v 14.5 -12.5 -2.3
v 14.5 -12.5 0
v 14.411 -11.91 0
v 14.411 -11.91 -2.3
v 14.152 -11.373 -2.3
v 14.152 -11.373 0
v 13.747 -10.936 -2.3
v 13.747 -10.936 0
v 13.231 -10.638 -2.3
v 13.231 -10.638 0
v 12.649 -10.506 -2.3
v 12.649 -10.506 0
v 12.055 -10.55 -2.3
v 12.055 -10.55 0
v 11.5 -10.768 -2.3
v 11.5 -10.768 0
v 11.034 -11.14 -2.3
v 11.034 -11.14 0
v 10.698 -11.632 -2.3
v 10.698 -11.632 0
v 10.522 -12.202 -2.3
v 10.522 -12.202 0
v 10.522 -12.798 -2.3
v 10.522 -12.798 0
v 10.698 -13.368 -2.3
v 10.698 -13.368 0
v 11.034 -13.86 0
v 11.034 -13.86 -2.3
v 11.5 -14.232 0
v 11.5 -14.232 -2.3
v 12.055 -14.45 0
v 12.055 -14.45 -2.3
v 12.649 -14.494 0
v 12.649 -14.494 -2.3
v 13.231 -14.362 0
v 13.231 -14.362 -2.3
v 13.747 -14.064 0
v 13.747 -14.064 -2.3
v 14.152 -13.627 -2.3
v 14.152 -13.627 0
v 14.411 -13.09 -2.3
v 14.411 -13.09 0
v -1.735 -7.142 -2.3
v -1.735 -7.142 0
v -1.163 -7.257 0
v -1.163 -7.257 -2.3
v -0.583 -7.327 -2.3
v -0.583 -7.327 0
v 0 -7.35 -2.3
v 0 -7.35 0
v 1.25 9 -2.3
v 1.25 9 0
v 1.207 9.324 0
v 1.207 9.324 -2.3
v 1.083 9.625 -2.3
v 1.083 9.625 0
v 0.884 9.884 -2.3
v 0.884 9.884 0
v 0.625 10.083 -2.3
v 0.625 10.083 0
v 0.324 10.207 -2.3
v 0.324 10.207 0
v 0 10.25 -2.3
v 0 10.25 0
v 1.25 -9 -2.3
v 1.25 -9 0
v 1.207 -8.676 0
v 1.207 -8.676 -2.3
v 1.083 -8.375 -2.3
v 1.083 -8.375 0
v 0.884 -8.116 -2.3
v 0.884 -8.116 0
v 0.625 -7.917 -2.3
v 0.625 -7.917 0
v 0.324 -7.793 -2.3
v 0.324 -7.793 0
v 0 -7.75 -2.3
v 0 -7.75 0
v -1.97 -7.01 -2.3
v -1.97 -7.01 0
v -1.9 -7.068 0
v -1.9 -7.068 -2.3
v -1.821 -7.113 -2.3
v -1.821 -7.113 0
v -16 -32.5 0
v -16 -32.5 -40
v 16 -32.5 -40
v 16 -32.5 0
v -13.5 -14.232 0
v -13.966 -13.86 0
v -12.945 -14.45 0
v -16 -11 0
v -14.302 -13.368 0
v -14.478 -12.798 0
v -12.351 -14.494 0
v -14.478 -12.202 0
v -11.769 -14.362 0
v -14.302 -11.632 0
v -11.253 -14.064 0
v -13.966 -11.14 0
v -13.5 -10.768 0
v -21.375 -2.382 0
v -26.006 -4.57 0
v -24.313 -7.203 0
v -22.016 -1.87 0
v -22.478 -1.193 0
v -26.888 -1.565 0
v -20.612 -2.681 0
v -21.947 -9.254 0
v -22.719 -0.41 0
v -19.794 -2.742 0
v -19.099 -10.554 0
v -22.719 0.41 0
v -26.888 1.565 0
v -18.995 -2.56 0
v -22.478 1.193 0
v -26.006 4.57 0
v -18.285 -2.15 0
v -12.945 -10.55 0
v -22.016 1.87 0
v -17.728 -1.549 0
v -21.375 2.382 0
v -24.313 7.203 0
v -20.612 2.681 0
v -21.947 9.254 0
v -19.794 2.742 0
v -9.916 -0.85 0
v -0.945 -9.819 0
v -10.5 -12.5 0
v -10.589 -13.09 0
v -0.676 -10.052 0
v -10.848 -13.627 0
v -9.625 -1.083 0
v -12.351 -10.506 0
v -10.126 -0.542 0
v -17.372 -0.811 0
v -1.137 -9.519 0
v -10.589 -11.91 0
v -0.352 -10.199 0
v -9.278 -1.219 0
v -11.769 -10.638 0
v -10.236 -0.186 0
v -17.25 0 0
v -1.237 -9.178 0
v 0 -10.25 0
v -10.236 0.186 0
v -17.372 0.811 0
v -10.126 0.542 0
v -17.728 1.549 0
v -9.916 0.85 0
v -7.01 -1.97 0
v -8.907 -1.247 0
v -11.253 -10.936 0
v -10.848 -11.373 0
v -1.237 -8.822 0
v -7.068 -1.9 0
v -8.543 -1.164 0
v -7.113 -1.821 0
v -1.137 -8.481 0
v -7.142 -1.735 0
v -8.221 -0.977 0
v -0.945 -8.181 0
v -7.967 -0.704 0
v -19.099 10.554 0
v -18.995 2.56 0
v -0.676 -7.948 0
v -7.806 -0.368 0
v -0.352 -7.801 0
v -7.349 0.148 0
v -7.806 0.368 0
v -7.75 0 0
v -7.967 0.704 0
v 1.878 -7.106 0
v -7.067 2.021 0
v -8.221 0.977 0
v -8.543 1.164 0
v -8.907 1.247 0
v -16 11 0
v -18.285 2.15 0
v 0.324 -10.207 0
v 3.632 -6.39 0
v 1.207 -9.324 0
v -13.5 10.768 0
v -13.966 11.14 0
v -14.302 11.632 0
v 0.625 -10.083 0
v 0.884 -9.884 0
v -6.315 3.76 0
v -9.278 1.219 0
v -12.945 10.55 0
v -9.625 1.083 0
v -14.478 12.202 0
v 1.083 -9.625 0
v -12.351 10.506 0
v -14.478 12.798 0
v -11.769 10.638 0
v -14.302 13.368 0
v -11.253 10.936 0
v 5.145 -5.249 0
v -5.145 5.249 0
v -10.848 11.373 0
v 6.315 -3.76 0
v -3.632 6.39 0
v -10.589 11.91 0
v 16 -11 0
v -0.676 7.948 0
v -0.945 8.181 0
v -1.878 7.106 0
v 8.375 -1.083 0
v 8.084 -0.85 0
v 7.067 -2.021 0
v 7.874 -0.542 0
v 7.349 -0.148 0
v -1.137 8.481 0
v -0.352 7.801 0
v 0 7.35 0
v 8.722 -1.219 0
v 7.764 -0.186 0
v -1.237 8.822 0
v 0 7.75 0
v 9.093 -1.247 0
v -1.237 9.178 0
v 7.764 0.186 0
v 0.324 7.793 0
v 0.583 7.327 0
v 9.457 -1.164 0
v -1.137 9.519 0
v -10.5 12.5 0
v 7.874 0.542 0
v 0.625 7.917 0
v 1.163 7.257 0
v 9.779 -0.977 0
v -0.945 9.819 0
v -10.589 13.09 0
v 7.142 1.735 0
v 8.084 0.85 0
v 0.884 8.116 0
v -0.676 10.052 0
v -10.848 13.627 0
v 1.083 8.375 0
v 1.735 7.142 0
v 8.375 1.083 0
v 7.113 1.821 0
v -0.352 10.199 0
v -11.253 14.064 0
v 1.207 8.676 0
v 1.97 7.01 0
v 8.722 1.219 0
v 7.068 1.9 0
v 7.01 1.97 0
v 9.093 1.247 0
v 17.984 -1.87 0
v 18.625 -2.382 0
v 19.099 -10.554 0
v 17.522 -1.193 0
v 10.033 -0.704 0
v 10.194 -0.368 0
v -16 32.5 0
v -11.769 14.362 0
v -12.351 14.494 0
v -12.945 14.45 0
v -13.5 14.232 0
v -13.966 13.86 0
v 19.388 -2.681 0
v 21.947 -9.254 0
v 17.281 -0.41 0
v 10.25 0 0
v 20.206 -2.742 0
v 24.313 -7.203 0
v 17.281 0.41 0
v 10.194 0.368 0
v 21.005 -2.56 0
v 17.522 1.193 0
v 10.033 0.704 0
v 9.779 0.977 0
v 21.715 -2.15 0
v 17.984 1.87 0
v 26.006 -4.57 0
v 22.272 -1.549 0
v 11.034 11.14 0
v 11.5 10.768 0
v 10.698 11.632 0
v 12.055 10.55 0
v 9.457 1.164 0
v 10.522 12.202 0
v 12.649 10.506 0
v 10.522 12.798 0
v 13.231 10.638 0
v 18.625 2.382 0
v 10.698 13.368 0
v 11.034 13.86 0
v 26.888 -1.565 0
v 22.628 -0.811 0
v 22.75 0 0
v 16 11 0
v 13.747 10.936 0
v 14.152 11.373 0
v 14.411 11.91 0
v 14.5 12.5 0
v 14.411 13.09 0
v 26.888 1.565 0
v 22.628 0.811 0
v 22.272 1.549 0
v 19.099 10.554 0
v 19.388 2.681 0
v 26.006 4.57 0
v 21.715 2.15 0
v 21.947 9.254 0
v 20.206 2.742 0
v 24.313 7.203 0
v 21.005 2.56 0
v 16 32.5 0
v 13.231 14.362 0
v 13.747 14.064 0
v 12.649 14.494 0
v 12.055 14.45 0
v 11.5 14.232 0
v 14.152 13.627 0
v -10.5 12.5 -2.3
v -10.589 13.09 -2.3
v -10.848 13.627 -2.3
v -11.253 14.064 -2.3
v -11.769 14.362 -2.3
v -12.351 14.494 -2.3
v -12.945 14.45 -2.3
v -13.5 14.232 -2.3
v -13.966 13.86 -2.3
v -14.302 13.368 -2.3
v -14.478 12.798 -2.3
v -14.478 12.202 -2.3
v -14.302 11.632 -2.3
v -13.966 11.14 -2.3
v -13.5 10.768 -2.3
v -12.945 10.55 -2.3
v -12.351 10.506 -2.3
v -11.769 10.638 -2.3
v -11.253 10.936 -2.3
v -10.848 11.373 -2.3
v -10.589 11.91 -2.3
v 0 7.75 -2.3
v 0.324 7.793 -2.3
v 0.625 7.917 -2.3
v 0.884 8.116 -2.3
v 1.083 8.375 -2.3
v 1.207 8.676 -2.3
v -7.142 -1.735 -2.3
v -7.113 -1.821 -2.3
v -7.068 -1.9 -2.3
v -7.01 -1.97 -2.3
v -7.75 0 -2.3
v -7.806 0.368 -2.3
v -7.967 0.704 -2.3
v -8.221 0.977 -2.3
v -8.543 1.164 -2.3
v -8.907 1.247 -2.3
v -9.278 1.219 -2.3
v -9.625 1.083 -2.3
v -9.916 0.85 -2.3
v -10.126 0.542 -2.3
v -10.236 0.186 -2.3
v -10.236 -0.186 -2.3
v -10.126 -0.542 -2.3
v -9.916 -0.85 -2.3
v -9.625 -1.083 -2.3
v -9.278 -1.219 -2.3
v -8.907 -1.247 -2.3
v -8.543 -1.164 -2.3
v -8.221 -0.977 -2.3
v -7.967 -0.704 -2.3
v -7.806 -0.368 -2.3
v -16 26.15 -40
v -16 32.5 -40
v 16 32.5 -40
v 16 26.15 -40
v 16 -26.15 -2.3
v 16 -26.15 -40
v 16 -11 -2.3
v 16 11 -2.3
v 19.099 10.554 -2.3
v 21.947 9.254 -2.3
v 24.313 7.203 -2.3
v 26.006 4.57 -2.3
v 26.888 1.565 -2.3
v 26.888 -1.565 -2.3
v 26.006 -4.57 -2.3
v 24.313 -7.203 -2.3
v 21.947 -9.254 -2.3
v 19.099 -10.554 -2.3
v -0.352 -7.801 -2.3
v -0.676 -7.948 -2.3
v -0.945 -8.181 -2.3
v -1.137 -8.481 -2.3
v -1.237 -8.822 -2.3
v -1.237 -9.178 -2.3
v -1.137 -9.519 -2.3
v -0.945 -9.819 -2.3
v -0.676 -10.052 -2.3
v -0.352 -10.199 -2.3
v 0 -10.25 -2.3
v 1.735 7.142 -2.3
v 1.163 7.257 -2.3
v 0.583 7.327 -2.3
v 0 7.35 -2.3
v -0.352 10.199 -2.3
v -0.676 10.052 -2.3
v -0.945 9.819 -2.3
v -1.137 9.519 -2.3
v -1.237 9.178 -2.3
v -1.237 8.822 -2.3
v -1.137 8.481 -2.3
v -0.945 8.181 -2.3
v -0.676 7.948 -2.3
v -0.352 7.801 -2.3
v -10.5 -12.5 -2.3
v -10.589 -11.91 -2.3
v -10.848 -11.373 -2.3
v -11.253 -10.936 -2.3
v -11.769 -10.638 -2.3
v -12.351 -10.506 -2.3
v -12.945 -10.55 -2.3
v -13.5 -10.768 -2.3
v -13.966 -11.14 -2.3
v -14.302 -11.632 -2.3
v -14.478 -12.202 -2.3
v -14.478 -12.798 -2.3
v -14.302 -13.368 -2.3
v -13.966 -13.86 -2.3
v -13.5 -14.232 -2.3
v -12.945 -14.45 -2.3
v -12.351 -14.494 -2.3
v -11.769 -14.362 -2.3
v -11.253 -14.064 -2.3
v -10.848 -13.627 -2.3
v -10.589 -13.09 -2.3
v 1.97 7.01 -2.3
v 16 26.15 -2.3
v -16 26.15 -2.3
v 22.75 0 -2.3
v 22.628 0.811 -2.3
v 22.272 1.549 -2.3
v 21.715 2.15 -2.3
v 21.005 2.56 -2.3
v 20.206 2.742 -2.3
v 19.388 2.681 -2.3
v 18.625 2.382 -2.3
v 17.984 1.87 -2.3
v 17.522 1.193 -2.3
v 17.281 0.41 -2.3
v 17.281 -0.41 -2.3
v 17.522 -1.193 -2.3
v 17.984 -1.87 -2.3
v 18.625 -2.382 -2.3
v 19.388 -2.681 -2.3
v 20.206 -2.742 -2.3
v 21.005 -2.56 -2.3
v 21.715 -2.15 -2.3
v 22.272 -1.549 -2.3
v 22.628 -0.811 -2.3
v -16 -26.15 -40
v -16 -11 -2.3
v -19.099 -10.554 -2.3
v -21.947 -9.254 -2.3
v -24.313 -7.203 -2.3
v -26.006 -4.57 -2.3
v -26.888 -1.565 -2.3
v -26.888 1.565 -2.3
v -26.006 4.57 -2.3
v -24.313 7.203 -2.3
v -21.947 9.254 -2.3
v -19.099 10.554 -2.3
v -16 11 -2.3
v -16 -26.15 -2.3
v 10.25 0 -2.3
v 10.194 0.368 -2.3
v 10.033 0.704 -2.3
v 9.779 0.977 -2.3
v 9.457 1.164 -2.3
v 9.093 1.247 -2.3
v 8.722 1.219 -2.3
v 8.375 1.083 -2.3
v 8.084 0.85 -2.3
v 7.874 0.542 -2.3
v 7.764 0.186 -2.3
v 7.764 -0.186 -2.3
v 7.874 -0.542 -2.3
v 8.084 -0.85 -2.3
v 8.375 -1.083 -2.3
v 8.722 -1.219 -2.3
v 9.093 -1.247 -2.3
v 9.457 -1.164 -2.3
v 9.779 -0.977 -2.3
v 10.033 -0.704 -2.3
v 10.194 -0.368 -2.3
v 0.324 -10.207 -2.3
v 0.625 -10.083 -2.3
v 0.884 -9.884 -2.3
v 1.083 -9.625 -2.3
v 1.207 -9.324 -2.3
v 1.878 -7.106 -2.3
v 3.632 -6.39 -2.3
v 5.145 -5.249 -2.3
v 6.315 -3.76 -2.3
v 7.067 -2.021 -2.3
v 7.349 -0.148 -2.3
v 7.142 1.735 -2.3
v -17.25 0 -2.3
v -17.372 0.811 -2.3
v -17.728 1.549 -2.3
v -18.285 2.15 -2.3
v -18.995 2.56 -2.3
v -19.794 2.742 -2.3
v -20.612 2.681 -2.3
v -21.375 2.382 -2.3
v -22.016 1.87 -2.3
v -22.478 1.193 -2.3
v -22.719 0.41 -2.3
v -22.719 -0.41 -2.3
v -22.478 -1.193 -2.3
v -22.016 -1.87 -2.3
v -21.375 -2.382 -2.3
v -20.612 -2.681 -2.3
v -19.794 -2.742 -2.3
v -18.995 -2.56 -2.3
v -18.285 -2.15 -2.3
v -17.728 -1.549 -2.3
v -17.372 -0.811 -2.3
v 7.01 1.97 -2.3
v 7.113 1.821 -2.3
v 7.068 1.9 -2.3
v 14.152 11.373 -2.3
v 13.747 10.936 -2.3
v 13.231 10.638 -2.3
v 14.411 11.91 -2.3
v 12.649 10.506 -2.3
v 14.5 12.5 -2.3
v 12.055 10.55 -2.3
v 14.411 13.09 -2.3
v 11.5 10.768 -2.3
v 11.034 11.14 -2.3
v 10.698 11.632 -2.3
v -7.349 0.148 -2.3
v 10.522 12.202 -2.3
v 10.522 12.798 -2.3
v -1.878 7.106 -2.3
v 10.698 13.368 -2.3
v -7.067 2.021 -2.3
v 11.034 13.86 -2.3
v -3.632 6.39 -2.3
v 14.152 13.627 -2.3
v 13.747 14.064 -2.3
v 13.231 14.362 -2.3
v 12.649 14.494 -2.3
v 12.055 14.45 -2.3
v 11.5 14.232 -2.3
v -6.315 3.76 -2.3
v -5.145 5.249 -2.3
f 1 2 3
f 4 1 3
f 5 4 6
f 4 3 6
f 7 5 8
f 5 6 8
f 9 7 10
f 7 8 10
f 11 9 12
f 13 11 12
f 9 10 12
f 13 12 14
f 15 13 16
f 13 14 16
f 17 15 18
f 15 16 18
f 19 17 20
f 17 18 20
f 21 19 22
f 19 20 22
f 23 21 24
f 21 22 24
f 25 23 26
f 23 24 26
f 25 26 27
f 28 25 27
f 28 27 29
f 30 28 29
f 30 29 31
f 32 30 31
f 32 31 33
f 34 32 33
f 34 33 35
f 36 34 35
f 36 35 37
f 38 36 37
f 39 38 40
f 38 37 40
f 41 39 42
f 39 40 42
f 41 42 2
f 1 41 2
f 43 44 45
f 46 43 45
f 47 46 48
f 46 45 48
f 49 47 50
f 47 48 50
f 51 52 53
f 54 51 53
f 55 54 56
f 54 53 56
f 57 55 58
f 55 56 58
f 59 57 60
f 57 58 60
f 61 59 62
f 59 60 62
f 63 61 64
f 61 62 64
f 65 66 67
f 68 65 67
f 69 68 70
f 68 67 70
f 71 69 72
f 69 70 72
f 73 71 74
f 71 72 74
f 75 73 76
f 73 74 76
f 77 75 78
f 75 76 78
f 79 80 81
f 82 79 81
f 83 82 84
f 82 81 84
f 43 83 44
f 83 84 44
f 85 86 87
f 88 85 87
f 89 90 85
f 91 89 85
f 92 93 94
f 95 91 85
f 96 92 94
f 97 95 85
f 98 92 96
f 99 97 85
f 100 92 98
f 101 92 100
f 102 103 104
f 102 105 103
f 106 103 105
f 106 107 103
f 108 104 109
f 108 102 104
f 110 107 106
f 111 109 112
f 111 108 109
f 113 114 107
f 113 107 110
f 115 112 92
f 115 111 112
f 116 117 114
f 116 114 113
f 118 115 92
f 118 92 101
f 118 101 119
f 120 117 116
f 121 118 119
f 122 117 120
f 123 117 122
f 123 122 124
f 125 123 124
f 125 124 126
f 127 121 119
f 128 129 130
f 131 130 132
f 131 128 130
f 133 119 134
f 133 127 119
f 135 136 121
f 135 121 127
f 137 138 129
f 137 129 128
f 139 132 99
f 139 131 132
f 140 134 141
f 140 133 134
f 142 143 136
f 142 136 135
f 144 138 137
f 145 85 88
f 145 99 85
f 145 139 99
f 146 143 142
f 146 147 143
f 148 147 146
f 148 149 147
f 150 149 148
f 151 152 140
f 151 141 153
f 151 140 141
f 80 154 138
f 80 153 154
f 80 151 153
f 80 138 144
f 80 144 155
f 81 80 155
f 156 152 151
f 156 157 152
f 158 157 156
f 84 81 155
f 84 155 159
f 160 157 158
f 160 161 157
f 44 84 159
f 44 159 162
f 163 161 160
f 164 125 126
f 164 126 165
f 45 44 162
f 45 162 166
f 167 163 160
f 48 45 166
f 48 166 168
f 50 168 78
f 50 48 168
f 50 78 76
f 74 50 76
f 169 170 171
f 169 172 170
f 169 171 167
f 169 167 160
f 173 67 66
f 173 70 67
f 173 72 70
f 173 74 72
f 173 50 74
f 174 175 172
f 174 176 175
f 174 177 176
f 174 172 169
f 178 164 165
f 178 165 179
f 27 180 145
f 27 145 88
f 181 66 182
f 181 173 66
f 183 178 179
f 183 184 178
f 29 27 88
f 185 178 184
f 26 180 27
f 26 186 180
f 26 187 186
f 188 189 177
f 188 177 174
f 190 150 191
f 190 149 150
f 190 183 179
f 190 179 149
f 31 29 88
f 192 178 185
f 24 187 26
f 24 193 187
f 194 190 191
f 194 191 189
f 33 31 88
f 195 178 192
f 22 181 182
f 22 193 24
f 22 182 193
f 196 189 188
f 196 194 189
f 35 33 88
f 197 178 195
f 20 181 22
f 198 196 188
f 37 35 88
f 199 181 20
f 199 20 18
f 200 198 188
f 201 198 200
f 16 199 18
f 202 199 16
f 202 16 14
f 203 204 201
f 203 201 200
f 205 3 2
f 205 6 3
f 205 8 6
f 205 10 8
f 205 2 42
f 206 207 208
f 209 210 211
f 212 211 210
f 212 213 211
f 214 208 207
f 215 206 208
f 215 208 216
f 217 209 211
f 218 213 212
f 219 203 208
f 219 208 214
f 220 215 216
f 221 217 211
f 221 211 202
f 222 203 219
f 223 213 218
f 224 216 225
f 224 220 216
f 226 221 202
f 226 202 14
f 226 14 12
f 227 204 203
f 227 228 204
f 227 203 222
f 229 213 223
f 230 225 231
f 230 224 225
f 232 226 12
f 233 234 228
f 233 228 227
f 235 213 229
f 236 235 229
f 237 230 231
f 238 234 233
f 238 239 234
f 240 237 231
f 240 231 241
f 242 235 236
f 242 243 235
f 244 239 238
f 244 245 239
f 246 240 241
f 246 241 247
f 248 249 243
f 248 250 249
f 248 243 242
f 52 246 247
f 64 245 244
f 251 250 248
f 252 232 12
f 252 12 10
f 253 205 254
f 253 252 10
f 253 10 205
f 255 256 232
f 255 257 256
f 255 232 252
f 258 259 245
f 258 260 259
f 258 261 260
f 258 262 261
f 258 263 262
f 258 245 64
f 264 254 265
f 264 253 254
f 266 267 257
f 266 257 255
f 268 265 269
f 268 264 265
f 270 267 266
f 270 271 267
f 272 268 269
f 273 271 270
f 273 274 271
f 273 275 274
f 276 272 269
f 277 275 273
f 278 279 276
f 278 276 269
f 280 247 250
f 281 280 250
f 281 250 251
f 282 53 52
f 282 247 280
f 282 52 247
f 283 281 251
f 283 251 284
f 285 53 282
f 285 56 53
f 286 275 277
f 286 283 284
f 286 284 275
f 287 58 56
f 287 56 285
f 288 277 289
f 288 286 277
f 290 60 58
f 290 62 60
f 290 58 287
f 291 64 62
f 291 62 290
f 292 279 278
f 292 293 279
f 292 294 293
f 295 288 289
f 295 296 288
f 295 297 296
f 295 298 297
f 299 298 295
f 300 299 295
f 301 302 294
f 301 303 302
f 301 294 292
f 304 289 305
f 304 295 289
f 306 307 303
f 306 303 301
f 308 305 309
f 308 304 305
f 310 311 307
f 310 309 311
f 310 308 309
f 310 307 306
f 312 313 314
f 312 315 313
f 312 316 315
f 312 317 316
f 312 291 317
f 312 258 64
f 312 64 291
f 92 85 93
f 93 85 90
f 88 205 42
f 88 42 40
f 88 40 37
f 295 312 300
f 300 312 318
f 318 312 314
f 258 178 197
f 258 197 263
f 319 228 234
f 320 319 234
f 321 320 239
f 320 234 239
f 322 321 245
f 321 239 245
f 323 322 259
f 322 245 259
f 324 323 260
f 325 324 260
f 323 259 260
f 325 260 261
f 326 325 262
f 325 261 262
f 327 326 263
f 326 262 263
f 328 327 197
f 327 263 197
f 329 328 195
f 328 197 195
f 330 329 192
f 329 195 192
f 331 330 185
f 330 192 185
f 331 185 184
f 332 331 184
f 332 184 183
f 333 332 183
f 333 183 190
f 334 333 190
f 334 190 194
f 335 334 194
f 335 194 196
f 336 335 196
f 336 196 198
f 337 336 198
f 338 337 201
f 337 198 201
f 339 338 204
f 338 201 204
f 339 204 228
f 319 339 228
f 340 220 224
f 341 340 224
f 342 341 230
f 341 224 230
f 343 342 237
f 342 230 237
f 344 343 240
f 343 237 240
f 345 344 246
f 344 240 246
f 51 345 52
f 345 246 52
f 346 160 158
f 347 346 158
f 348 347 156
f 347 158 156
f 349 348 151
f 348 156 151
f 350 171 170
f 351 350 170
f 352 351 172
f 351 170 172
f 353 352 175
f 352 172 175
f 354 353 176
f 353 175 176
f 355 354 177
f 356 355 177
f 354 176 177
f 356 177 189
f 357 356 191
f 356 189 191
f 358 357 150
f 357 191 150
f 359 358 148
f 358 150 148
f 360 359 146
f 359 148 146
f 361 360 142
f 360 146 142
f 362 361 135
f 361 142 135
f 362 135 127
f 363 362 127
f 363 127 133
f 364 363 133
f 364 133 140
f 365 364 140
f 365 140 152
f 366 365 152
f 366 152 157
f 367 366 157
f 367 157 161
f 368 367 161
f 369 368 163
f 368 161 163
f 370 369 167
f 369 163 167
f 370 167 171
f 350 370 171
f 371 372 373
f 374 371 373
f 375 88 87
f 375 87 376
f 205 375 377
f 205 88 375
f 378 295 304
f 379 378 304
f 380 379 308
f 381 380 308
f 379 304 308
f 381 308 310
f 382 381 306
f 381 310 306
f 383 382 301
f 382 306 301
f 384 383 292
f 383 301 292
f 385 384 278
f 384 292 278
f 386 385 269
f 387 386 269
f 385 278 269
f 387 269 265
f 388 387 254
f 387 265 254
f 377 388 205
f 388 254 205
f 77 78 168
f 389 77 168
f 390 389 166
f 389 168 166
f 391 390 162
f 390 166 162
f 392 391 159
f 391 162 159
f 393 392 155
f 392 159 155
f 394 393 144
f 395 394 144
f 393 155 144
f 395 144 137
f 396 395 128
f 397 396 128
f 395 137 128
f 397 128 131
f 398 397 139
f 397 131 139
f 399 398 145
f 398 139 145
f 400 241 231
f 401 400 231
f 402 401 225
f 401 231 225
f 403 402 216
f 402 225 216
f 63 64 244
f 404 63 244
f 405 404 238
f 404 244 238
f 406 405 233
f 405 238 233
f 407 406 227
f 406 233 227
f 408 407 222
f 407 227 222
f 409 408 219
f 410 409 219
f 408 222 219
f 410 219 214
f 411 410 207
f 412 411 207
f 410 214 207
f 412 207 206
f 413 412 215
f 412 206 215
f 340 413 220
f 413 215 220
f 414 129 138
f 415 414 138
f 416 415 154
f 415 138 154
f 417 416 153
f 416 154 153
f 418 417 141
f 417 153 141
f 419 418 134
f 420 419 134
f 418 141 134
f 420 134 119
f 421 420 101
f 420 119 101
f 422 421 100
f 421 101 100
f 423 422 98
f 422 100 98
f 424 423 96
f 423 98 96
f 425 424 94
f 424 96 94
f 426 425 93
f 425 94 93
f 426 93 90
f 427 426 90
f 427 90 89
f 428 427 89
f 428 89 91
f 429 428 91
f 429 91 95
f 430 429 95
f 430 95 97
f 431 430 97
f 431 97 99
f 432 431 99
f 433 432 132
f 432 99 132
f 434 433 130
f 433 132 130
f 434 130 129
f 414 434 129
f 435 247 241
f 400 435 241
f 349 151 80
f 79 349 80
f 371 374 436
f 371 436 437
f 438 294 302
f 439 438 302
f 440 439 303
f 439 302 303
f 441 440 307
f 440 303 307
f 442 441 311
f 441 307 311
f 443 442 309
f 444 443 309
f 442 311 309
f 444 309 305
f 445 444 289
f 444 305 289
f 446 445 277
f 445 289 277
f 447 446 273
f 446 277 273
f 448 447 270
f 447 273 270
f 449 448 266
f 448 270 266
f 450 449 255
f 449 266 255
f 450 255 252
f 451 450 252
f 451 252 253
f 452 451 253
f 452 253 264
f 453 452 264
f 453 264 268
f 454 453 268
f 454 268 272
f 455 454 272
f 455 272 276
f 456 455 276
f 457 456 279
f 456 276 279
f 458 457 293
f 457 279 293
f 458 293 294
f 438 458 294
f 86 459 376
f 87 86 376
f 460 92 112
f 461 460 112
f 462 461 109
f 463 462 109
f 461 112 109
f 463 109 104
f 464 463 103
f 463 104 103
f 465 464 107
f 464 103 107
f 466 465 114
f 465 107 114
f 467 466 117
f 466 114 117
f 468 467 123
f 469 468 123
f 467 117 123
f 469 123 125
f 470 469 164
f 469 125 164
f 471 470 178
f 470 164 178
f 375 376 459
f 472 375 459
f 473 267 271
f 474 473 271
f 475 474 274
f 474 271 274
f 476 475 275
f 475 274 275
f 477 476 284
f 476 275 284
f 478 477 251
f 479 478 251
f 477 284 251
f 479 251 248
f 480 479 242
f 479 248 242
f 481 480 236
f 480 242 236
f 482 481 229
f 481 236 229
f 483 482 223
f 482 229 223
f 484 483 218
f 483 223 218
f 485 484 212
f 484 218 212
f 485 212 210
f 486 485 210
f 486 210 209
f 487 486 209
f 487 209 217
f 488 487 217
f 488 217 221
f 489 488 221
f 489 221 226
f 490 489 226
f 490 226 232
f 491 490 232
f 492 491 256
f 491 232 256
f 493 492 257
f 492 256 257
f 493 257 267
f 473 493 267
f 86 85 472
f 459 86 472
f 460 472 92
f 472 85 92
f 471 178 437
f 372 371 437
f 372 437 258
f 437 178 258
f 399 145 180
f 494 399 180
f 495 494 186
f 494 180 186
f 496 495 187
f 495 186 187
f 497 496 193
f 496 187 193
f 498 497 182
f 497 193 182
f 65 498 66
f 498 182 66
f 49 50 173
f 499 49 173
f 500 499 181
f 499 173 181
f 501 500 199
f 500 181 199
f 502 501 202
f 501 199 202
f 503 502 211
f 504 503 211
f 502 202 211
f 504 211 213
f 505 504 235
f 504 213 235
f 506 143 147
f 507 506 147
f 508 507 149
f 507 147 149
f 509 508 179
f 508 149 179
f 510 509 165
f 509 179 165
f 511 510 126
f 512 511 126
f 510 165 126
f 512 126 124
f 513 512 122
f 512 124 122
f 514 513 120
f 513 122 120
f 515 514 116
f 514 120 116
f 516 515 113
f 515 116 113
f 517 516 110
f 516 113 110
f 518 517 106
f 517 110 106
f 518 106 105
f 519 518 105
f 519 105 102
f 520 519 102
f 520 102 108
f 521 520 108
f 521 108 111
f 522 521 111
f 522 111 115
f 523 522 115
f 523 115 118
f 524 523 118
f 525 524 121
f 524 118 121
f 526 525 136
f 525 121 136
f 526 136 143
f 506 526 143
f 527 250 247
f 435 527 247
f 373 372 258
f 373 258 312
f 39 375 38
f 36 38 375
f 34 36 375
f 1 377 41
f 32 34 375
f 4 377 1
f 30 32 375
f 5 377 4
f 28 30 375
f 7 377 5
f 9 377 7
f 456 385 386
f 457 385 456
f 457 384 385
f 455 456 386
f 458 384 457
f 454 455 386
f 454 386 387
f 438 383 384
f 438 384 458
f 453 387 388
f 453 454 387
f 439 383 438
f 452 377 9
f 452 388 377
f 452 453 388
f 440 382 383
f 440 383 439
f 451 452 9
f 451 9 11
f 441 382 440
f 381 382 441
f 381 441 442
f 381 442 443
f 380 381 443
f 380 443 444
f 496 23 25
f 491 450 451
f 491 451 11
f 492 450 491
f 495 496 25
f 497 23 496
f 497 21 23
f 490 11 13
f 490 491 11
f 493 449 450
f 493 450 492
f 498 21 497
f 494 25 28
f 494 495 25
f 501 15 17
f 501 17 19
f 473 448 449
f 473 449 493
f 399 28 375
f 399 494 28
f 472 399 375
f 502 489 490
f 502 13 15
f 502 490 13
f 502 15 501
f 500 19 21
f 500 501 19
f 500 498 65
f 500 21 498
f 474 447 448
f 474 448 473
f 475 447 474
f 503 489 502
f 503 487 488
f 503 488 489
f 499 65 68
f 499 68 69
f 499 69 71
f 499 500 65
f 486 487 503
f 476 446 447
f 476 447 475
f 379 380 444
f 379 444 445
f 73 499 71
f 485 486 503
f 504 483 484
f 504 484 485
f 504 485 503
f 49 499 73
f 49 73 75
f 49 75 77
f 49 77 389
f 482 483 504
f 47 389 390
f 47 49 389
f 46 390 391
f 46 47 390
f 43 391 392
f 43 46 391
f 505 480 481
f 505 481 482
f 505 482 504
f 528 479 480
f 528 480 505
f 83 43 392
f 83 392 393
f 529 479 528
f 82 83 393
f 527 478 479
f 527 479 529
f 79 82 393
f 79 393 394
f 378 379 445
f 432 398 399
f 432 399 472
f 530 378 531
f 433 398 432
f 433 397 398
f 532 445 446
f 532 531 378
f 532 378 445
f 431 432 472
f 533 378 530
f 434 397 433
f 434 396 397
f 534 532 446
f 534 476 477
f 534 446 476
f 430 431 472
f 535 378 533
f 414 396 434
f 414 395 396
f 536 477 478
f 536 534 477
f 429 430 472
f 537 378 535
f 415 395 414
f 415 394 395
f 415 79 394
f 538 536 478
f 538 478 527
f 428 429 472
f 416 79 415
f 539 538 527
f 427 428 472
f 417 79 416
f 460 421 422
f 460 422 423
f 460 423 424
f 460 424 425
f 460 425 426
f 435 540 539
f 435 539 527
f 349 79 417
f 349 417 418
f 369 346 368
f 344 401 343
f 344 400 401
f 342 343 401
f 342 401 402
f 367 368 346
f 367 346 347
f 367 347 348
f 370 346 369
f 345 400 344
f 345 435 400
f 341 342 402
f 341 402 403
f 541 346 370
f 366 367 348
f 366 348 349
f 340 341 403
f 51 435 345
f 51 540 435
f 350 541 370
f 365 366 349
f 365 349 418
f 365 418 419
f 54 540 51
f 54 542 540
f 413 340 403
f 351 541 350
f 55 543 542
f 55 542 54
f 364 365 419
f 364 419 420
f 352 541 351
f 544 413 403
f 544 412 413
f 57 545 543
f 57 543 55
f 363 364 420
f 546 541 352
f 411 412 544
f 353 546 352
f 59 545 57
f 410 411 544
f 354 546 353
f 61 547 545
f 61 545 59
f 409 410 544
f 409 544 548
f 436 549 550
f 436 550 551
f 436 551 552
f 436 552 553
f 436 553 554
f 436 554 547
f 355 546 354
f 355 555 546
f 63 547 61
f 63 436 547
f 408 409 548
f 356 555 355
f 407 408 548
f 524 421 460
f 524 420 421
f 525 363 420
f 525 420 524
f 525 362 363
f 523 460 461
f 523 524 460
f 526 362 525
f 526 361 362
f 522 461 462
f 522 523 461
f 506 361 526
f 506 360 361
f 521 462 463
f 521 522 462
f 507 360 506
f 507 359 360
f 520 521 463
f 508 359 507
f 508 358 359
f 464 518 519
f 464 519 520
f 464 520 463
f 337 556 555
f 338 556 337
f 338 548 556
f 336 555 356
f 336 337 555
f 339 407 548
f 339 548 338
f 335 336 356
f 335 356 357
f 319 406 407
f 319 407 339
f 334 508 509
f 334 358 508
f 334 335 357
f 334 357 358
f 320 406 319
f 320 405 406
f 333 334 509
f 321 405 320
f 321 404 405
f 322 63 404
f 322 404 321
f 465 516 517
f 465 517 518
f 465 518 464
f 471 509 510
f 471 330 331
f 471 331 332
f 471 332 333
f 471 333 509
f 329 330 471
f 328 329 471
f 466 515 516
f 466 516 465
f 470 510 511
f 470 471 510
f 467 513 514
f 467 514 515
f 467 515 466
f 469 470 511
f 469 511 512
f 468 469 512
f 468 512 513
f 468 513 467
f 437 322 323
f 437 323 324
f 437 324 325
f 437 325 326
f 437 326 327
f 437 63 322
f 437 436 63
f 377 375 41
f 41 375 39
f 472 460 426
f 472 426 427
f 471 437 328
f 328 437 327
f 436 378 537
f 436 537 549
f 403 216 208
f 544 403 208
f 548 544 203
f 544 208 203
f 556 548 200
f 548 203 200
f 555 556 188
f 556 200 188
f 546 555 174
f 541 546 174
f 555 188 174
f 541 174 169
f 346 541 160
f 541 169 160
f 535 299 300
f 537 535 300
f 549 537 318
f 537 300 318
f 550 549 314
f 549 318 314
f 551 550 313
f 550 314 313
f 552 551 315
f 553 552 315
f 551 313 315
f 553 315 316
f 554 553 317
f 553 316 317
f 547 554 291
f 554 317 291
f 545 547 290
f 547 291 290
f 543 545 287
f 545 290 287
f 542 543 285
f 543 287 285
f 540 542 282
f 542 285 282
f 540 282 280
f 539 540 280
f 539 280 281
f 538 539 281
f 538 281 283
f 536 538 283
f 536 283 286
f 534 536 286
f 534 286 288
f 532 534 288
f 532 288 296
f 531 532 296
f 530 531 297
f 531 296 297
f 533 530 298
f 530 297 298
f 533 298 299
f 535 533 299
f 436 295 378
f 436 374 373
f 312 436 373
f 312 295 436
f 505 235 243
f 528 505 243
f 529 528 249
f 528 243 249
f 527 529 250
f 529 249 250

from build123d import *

# Parameters (mm, degrees)
SKETCH1_W           = 32
SKETCH1_H           = 65
BOSS_EXTRUDE1_DEPTH = 40
SKETCH2_W           = 32
SKETCH2_H           = 52.3
CUT_EXTRUDE1_DEPTH  = 37.7
BOSS_EXTRUDE4_DEPTH = 2.3
SKETCH3_7_R         = 1.25
SKETCH3_7_R_2       = 2
SKETCH3_7_R_3       = 2.75
CUT_EXTRUDE3_DEPTH  = 2.3


with BuildPart() as part:
    # Sketch1 → Boss-Extrude1 (new body)
    with BuildSketch(Plane.XY):
        Rectangle(SKETCH1_W, SKETCH1_H)
    extrude(amount=-BOSS_EXTRUDE1_DEPTH)

    # Sketch2 → Cut-Extrude1 (cut)
    with BuildSketch(Plane(origin=(0, 0, -40), x_dir=(-1, 0, 0), z_dir=(0, 0, -1))):
        Rectangle(SKETCH2_W, SKETCH2_H)
    extrude(amount=-CUT_EXTRUDE1_DEPTH, mode=Mode.SUBTRACT)

    # Sketch3 → Boss-Extrude4 (add)
    with BuildSketch(Plane.XY):
        with BuildLine():
            Line((16, -32.5), (-16, -32.5))
            Line((-16, -32.5), (-16, -11))
            ThreePointArc((-16, -11), (-27, 0), (-16, 11))
            Line((-16, 11), (-16, 32.5))
            Line((-16, 32.5), (16, 32.5))
            Line((16, 32.5), (16, 11))
            ThreePointArc((16, 11), (27, 0), (16, -11))
            Line((16, -11), (16, -32.5))
        make_face()
    extrude(amount=-BOSS_EXTRUDE4_DEPTH)

    # Sketch3<7> → Cut-Extrude3 (cut)
    with BuildSketch(Plane.XY):
        with Locations((0, -9.000000134)):
            Circle(SKETCH3_7_R)
        with BuildLine():
            ThreePointArc((-1.734657981, -7.142370873), (5.197234842, -5.197234842), (7.142370873, 1.734657981))
            ThreePointArc((7.142370873, 1.734657981), (7.092420905, 1.861539458), (7.010048694, 1.970207427))
            Line((7.010048694, 1.970207427), (1.970207427, 7.010048694))
            Line((1.970207427, 7.010048694), (1.734657981, 7.142370873))
            ThreePointArc((1.734657981, 7.142370873), (-5.197234842, 5.197234842), (-7.142370873, -1.734657981))
            ThreePointArc((-7.142370873, -1.734657981), (-7.092420905, -1.861539458), (-7.010048694, -1.970207427))
            Line((-7.010048694, -1.970207427), (-1.970207427, -7.010048694))
            ThreePointArc((-1.970207427, -7.010048694), (-1.861539458, -7.092420905), (-1.734657981, -7.142370873))
        make_face()
        with Locations((0, 9.000000134)):
            Circle(SKETCH3_7_R)
        with Locations((12.5, -12.5)):
            Circle(SKETCH3_7_R_2)
        with Locations((-12.5, -12.5)):
            Circle(SKETCH3_7_R_2)
        with Locations((-12.5, 12.5)):
            Circle(SKETCH3_7_R_2)
        with Locations((12.5, 12.5)):
            Circle(SKETCH3_7_R_2)
        with Locations((9.000000134, 0)):
            Circle(SKETCH3_7_R)
        with Locations((-9.000000134, 0)):
            Circle(SKETCH3_7_R)
        with Locations((-20, 0)):
            Circle(SKETCH3_7_R_3)
        with Locations((20, 0)):
            Circle(SKETCH3_7_R_3)
    extrude(amount=-CUT_EXTRUDE3_DEPTH, mode=Mode.SUBTRACT)


solid = part.part
